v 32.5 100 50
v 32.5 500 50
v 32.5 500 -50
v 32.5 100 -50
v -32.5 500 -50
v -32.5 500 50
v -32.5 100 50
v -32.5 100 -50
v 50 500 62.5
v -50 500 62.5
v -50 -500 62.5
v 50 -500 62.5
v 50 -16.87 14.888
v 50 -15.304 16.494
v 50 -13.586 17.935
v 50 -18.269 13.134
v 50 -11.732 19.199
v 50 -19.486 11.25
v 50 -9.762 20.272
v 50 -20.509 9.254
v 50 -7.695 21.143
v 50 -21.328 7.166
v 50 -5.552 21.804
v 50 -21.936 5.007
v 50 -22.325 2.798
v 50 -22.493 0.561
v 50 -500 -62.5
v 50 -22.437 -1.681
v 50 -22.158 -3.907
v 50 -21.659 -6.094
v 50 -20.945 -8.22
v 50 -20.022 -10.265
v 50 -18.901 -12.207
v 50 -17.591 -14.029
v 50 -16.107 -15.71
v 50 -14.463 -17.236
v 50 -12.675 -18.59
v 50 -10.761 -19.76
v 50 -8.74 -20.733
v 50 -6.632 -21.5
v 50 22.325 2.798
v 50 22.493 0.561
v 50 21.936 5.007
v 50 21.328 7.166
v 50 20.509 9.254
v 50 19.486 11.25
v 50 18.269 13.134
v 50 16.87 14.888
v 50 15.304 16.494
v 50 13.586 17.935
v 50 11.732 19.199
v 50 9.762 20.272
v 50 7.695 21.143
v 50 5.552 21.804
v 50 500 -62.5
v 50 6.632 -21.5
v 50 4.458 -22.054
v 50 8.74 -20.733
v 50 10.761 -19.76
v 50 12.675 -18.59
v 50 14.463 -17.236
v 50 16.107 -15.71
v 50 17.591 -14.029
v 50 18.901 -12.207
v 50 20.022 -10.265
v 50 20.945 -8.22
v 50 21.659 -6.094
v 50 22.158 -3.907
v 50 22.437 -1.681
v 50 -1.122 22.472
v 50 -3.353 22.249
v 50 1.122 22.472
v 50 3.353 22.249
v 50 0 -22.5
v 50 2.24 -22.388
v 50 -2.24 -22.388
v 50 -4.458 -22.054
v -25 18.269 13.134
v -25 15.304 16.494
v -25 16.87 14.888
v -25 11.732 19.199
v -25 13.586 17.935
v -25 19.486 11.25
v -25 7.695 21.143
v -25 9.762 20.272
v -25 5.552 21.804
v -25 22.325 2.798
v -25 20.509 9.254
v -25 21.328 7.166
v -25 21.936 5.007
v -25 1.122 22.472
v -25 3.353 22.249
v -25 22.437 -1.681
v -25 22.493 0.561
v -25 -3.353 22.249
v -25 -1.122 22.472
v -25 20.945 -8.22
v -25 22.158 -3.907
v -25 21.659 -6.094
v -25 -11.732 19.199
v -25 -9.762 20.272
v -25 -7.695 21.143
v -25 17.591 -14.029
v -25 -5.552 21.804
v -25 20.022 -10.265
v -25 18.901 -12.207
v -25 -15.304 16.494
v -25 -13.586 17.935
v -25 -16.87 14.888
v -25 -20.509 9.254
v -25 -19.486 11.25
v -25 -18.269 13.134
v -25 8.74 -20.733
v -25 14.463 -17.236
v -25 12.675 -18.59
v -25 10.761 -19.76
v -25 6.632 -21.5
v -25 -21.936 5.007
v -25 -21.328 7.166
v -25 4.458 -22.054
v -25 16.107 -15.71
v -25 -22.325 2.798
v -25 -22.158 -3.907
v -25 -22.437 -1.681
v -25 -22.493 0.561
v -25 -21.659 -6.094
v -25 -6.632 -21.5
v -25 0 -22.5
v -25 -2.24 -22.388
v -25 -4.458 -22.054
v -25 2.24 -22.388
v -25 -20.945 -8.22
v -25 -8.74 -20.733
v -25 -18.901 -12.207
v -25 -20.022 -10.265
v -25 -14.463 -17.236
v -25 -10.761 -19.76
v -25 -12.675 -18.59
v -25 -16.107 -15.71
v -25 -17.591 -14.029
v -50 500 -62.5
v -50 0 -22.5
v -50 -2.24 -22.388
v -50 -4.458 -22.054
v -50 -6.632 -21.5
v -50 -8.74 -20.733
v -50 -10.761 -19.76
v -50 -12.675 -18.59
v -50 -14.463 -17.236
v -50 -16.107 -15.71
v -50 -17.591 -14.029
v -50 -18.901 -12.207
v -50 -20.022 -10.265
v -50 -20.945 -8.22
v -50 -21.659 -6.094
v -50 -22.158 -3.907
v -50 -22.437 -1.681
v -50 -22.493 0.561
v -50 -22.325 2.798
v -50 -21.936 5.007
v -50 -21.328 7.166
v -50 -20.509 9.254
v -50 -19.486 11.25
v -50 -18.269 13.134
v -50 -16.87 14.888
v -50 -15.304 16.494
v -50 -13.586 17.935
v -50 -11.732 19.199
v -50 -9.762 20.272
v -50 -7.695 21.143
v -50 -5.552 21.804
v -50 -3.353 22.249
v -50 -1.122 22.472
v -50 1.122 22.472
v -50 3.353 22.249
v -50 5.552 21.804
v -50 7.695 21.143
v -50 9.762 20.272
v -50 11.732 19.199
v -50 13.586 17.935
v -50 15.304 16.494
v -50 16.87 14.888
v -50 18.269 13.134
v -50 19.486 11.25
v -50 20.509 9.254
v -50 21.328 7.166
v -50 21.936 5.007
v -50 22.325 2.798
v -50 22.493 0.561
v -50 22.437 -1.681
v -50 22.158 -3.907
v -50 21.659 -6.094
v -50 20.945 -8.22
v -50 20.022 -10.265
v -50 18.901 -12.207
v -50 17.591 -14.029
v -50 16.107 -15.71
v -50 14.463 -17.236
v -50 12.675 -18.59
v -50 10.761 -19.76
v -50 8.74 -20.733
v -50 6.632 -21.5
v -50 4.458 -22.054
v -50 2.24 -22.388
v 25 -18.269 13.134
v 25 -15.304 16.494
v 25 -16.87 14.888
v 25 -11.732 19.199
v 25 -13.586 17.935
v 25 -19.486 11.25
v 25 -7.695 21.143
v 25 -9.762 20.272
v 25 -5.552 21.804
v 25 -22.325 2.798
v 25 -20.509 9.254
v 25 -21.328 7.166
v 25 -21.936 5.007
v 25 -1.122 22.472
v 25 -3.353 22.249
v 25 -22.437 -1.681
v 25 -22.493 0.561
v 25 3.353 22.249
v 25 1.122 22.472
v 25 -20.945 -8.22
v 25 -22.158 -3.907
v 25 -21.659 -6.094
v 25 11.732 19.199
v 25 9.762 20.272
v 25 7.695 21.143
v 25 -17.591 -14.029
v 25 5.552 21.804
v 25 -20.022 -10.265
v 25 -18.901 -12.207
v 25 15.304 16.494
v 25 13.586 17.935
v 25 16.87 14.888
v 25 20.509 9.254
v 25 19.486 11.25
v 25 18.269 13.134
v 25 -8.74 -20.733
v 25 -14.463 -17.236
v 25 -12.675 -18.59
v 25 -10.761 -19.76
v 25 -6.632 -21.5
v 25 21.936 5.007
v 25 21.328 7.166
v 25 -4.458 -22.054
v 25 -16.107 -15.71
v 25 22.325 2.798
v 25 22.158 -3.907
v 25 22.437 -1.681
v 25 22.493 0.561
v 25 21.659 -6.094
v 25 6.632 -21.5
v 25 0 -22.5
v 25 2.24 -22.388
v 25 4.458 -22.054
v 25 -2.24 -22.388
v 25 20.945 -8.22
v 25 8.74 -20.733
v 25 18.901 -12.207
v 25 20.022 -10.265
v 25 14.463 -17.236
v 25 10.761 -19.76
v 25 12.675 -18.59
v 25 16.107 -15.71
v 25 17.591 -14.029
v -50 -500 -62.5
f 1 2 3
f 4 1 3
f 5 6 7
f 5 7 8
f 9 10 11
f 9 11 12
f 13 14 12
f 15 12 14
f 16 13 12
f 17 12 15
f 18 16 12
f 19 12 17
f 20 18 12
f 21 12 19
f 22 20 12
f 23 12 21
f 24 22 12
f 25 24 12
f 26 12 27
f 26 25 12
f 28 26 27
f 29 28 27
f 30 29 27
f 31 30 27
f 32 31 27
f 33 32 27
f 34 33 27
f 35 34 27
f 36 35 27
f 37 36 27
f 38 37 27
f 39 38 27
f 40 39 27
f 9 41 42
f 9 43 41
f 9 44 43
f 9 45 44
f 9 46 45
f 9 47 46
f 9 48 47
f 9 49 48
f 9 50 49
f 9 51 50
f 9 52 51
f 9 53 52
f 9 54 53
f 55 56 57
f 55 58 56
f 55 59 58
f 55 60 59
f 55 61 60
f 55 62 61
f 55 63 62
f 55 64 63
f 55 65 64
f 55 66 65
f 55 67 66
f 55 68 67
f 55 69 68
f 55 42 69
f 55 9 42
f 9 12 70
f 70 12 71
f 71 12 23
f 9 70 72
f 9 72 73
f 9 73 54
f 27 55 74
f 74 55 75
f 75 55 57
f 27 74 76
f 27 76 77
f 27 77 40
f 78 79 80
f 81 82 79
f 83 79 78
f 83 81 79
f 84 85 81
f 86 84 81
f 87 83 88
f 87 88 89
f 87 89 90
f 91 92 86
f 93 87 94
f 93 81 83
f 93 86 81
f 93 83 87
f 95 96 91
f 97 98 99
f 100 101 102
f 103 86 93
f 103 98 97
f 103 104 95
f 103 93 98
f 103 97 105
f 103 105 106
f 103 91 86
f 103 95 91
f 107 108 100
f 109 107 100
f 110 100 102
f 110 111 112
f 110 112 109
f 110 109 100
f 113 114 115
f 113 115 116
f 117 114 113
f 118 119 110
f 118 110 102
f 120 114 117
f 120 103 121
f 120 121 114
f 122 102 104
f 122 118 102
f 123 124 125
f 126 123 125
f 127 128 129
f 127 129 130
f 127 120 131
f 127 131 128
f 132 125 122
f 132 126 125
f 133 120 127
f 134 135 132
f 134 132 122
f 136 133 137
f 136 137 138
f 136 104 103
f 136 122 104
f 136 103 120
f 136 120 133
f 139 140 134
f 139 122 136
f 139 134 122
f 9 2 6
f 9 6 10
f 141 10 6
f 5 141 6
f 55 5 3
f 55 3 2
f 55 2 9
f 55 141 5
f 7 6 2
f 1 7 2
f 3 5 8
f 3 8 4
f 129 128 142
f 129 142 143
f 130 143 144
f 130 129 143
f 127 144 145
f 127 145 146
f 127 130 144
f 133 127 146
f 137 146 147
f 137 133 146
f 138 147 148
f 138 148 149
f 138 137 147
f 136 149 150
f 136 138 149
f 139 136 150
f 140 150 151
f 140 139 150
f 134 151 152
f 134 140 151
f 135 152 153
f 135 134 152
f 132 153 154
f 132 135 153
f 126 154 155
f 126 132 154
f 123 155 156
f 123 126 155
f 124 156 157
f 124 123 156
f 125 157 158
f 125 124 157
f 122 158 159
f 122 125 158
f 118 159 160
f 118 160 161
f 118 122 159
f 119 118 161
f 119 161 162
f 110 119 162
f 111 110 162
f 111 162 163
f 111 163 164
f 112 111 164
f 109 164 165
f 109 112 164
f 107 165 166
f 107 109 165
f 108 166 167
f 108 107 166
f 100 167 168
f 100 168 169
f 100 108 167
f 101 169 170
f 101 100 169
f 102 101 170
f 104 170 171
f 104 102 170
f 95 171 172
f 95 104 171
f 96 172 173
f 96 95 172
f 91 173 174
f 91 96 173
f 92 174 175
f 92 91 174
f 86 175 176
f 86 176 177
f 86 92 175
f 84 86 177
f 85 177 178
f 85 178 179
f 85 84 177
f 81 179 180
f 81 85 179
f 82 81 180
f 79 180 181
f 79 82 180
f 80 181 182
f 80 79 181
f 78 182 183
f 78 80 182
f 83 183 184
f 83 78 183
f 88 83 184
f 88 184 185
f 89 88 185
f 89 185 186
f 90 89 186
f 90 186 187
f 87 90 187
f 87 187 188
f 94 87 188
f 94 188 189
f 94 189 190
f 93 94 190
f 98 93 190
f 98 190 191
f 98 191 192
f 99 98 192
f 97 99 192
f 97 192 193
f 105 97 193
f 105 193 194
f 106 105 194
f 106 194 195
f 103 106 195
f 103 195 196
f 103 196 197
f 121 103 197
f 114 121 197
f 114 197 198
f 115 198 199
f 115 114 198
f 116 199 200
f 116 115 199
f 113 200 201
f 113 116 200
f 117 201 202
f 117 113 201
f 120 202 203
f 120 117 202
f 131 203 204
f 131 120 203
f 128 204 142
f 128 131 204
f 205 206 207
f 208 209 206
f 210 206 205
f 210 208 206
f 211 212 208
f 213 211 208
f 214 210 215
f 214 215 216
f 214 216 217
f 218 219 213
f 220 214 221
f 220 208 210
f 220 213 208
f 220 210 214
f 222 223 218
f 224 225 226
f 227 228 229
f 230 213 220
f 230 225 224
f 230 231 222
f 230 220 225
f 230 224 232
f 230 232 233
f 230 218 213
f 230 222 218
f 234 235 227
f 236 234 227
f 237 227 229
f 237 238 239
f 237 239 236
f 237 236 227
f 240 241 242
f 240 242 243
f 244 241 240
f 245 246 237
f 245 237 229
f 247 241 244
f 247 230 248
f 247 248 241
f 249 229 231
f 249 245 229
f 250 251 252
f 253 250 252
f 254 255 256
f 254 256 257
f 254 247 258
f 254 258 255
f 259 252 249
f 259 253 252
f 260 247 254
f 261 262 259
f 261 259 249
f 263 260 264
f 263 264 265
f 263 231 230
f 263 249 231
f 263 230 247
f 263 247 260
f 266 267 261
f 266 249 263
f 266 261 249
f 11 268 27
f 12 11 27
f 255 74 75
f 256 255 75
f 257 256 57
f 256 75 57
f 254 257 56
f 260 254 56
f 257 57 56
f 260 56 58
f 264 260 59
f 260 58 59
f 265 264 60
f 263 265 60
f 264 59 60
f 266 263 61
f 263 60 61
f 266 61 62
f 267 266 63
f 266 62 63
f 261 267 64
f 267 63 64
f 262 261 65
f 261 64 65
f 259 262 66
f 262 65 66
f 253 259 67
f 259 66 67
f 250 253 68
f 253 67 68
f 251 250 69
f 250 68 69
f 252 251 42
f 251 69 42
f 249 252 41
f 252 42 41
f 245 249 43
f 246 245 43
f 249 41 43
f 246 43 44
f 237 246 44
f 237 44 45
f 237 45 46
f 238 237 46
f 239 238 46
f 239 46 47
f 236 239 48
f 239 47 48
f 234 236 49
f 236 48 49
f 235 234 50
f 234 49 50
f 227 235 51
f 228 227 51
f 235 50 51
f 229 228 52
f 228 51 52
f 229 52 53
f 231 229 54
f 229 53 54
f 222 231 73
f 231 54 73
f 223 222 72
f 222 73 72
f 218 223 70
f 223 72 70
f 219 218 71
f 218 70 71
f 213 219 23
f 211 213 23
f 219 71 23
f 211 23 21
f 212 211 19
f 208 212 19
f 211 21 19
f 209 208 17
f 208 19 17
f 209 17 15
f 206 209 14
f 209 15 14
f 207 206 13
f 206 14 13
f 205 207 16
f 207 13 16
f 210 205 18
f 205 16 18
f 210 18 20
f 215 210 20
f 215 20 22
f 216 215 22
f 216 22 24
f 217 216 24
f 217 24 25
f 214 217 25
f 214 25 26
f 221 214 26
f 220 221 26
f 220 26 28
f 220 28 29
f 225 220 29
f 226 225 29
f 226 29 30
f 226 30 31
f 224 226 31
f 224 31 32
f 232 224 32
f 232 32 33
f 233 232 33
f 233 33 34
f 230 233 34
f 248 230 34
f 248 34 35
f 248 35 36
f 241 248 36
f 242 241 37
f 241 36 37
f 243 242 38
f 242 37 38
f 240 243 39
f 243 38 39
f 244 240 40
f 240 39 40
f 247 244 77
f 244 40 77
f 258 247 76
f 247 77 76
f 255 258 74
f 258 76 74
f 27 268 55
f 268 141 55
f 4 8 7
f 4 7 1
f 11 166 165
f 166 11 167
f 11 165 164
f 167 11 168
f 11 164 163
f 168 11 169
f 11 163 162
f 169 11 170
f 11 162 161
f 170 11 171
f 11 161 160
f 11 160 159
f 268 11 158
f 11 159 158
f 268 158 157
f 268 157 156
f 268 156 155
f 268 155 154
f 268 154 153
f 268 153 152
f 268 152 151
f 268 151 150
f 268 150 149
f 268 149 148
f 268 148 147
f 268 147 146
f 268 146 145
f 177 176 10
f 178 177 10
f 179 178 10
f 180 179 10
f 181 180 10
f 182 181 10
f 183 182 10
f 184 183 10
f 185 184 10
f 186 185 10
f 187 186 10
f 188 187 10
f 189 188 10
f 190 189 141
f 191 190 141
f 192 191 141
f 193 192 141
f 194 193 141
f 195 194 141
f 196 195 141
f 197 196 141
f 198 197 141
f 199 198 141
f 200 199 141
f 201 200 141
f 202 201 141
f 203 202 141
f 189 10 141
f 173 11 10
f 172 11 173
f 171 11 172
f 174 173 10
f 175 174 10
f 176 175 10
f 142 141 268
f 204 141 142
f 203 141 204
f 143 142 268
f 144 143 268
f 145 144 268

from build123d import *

# Parameters (mm, degrees)
SKETCH1_W           = 100
SKETCH1_H           = 125
BOSS_EXTRUDE1_DEPTH = 500
SKETCH2_R           = 22.5
CUT_EXTRUDE1_DEPTH  = 25
CUT_EXTRUDE2_START  = -25
SKETCH3_R           = 22.5
CUT_EXTRUDE2_DEPTH  = 25
SKETCH4_W           = 65
SKETCH4_H           = 100
CUT_EXTRUDE3_DEPTH  = 400


with BuildPart() as part:
    # Sketch1 → Boss-Extrude1 (new, symmetric)
    with BuildSketch(Plane(origin=(0, 0, 0), x_dir=(1, 0, 0), z_dir=(0, 1, 0))):
        Rectangle(SKETCH1_W, SKETCH1_H)
    extrude(amount=BOSS_EXTRUDE1_DEPTH, both=True)

    # Sketch2 → Cut-Extrude1 (cut)
    with BuildSketch(Plane(origin=(50, 0, 0), x_dir=(0, 0, -1), z_dir=(1, 0, 0))):
        Circle(SKETCH2_R)
    extrude(amount=-CUT_EXTRUDE1_DEPTH, mode=Mode.SUBTRACT)

    # Sketch3 → Cut-Extrude2 (cut)
    with BuildSketch(Plane.ZY.offset(50).offset(CUT_EXTRUDE2_START)):
        with Locations(Location((0, 0, 0), (0, 0, 180))):
            Circle(SKETCH3_R)
    extrude(amount=CUT_EXTRUDE2_DEPTH, mode=Mode.SUBTRACT)

    # Sketch4 → Cut-Extrude3 (cut)
    with BuildSketch(Plane(origin=(0, 500, 0), x_dir=(1, 0, 0), z_dir=(0, 1, 0))):
        Rectangle(SKETCH4_W, SKETCH4_H)
    extrude(amount=-CUT_EXTRUDE3_DEPTH, mode=Mode.SUBTRACT)


solid = part.part
